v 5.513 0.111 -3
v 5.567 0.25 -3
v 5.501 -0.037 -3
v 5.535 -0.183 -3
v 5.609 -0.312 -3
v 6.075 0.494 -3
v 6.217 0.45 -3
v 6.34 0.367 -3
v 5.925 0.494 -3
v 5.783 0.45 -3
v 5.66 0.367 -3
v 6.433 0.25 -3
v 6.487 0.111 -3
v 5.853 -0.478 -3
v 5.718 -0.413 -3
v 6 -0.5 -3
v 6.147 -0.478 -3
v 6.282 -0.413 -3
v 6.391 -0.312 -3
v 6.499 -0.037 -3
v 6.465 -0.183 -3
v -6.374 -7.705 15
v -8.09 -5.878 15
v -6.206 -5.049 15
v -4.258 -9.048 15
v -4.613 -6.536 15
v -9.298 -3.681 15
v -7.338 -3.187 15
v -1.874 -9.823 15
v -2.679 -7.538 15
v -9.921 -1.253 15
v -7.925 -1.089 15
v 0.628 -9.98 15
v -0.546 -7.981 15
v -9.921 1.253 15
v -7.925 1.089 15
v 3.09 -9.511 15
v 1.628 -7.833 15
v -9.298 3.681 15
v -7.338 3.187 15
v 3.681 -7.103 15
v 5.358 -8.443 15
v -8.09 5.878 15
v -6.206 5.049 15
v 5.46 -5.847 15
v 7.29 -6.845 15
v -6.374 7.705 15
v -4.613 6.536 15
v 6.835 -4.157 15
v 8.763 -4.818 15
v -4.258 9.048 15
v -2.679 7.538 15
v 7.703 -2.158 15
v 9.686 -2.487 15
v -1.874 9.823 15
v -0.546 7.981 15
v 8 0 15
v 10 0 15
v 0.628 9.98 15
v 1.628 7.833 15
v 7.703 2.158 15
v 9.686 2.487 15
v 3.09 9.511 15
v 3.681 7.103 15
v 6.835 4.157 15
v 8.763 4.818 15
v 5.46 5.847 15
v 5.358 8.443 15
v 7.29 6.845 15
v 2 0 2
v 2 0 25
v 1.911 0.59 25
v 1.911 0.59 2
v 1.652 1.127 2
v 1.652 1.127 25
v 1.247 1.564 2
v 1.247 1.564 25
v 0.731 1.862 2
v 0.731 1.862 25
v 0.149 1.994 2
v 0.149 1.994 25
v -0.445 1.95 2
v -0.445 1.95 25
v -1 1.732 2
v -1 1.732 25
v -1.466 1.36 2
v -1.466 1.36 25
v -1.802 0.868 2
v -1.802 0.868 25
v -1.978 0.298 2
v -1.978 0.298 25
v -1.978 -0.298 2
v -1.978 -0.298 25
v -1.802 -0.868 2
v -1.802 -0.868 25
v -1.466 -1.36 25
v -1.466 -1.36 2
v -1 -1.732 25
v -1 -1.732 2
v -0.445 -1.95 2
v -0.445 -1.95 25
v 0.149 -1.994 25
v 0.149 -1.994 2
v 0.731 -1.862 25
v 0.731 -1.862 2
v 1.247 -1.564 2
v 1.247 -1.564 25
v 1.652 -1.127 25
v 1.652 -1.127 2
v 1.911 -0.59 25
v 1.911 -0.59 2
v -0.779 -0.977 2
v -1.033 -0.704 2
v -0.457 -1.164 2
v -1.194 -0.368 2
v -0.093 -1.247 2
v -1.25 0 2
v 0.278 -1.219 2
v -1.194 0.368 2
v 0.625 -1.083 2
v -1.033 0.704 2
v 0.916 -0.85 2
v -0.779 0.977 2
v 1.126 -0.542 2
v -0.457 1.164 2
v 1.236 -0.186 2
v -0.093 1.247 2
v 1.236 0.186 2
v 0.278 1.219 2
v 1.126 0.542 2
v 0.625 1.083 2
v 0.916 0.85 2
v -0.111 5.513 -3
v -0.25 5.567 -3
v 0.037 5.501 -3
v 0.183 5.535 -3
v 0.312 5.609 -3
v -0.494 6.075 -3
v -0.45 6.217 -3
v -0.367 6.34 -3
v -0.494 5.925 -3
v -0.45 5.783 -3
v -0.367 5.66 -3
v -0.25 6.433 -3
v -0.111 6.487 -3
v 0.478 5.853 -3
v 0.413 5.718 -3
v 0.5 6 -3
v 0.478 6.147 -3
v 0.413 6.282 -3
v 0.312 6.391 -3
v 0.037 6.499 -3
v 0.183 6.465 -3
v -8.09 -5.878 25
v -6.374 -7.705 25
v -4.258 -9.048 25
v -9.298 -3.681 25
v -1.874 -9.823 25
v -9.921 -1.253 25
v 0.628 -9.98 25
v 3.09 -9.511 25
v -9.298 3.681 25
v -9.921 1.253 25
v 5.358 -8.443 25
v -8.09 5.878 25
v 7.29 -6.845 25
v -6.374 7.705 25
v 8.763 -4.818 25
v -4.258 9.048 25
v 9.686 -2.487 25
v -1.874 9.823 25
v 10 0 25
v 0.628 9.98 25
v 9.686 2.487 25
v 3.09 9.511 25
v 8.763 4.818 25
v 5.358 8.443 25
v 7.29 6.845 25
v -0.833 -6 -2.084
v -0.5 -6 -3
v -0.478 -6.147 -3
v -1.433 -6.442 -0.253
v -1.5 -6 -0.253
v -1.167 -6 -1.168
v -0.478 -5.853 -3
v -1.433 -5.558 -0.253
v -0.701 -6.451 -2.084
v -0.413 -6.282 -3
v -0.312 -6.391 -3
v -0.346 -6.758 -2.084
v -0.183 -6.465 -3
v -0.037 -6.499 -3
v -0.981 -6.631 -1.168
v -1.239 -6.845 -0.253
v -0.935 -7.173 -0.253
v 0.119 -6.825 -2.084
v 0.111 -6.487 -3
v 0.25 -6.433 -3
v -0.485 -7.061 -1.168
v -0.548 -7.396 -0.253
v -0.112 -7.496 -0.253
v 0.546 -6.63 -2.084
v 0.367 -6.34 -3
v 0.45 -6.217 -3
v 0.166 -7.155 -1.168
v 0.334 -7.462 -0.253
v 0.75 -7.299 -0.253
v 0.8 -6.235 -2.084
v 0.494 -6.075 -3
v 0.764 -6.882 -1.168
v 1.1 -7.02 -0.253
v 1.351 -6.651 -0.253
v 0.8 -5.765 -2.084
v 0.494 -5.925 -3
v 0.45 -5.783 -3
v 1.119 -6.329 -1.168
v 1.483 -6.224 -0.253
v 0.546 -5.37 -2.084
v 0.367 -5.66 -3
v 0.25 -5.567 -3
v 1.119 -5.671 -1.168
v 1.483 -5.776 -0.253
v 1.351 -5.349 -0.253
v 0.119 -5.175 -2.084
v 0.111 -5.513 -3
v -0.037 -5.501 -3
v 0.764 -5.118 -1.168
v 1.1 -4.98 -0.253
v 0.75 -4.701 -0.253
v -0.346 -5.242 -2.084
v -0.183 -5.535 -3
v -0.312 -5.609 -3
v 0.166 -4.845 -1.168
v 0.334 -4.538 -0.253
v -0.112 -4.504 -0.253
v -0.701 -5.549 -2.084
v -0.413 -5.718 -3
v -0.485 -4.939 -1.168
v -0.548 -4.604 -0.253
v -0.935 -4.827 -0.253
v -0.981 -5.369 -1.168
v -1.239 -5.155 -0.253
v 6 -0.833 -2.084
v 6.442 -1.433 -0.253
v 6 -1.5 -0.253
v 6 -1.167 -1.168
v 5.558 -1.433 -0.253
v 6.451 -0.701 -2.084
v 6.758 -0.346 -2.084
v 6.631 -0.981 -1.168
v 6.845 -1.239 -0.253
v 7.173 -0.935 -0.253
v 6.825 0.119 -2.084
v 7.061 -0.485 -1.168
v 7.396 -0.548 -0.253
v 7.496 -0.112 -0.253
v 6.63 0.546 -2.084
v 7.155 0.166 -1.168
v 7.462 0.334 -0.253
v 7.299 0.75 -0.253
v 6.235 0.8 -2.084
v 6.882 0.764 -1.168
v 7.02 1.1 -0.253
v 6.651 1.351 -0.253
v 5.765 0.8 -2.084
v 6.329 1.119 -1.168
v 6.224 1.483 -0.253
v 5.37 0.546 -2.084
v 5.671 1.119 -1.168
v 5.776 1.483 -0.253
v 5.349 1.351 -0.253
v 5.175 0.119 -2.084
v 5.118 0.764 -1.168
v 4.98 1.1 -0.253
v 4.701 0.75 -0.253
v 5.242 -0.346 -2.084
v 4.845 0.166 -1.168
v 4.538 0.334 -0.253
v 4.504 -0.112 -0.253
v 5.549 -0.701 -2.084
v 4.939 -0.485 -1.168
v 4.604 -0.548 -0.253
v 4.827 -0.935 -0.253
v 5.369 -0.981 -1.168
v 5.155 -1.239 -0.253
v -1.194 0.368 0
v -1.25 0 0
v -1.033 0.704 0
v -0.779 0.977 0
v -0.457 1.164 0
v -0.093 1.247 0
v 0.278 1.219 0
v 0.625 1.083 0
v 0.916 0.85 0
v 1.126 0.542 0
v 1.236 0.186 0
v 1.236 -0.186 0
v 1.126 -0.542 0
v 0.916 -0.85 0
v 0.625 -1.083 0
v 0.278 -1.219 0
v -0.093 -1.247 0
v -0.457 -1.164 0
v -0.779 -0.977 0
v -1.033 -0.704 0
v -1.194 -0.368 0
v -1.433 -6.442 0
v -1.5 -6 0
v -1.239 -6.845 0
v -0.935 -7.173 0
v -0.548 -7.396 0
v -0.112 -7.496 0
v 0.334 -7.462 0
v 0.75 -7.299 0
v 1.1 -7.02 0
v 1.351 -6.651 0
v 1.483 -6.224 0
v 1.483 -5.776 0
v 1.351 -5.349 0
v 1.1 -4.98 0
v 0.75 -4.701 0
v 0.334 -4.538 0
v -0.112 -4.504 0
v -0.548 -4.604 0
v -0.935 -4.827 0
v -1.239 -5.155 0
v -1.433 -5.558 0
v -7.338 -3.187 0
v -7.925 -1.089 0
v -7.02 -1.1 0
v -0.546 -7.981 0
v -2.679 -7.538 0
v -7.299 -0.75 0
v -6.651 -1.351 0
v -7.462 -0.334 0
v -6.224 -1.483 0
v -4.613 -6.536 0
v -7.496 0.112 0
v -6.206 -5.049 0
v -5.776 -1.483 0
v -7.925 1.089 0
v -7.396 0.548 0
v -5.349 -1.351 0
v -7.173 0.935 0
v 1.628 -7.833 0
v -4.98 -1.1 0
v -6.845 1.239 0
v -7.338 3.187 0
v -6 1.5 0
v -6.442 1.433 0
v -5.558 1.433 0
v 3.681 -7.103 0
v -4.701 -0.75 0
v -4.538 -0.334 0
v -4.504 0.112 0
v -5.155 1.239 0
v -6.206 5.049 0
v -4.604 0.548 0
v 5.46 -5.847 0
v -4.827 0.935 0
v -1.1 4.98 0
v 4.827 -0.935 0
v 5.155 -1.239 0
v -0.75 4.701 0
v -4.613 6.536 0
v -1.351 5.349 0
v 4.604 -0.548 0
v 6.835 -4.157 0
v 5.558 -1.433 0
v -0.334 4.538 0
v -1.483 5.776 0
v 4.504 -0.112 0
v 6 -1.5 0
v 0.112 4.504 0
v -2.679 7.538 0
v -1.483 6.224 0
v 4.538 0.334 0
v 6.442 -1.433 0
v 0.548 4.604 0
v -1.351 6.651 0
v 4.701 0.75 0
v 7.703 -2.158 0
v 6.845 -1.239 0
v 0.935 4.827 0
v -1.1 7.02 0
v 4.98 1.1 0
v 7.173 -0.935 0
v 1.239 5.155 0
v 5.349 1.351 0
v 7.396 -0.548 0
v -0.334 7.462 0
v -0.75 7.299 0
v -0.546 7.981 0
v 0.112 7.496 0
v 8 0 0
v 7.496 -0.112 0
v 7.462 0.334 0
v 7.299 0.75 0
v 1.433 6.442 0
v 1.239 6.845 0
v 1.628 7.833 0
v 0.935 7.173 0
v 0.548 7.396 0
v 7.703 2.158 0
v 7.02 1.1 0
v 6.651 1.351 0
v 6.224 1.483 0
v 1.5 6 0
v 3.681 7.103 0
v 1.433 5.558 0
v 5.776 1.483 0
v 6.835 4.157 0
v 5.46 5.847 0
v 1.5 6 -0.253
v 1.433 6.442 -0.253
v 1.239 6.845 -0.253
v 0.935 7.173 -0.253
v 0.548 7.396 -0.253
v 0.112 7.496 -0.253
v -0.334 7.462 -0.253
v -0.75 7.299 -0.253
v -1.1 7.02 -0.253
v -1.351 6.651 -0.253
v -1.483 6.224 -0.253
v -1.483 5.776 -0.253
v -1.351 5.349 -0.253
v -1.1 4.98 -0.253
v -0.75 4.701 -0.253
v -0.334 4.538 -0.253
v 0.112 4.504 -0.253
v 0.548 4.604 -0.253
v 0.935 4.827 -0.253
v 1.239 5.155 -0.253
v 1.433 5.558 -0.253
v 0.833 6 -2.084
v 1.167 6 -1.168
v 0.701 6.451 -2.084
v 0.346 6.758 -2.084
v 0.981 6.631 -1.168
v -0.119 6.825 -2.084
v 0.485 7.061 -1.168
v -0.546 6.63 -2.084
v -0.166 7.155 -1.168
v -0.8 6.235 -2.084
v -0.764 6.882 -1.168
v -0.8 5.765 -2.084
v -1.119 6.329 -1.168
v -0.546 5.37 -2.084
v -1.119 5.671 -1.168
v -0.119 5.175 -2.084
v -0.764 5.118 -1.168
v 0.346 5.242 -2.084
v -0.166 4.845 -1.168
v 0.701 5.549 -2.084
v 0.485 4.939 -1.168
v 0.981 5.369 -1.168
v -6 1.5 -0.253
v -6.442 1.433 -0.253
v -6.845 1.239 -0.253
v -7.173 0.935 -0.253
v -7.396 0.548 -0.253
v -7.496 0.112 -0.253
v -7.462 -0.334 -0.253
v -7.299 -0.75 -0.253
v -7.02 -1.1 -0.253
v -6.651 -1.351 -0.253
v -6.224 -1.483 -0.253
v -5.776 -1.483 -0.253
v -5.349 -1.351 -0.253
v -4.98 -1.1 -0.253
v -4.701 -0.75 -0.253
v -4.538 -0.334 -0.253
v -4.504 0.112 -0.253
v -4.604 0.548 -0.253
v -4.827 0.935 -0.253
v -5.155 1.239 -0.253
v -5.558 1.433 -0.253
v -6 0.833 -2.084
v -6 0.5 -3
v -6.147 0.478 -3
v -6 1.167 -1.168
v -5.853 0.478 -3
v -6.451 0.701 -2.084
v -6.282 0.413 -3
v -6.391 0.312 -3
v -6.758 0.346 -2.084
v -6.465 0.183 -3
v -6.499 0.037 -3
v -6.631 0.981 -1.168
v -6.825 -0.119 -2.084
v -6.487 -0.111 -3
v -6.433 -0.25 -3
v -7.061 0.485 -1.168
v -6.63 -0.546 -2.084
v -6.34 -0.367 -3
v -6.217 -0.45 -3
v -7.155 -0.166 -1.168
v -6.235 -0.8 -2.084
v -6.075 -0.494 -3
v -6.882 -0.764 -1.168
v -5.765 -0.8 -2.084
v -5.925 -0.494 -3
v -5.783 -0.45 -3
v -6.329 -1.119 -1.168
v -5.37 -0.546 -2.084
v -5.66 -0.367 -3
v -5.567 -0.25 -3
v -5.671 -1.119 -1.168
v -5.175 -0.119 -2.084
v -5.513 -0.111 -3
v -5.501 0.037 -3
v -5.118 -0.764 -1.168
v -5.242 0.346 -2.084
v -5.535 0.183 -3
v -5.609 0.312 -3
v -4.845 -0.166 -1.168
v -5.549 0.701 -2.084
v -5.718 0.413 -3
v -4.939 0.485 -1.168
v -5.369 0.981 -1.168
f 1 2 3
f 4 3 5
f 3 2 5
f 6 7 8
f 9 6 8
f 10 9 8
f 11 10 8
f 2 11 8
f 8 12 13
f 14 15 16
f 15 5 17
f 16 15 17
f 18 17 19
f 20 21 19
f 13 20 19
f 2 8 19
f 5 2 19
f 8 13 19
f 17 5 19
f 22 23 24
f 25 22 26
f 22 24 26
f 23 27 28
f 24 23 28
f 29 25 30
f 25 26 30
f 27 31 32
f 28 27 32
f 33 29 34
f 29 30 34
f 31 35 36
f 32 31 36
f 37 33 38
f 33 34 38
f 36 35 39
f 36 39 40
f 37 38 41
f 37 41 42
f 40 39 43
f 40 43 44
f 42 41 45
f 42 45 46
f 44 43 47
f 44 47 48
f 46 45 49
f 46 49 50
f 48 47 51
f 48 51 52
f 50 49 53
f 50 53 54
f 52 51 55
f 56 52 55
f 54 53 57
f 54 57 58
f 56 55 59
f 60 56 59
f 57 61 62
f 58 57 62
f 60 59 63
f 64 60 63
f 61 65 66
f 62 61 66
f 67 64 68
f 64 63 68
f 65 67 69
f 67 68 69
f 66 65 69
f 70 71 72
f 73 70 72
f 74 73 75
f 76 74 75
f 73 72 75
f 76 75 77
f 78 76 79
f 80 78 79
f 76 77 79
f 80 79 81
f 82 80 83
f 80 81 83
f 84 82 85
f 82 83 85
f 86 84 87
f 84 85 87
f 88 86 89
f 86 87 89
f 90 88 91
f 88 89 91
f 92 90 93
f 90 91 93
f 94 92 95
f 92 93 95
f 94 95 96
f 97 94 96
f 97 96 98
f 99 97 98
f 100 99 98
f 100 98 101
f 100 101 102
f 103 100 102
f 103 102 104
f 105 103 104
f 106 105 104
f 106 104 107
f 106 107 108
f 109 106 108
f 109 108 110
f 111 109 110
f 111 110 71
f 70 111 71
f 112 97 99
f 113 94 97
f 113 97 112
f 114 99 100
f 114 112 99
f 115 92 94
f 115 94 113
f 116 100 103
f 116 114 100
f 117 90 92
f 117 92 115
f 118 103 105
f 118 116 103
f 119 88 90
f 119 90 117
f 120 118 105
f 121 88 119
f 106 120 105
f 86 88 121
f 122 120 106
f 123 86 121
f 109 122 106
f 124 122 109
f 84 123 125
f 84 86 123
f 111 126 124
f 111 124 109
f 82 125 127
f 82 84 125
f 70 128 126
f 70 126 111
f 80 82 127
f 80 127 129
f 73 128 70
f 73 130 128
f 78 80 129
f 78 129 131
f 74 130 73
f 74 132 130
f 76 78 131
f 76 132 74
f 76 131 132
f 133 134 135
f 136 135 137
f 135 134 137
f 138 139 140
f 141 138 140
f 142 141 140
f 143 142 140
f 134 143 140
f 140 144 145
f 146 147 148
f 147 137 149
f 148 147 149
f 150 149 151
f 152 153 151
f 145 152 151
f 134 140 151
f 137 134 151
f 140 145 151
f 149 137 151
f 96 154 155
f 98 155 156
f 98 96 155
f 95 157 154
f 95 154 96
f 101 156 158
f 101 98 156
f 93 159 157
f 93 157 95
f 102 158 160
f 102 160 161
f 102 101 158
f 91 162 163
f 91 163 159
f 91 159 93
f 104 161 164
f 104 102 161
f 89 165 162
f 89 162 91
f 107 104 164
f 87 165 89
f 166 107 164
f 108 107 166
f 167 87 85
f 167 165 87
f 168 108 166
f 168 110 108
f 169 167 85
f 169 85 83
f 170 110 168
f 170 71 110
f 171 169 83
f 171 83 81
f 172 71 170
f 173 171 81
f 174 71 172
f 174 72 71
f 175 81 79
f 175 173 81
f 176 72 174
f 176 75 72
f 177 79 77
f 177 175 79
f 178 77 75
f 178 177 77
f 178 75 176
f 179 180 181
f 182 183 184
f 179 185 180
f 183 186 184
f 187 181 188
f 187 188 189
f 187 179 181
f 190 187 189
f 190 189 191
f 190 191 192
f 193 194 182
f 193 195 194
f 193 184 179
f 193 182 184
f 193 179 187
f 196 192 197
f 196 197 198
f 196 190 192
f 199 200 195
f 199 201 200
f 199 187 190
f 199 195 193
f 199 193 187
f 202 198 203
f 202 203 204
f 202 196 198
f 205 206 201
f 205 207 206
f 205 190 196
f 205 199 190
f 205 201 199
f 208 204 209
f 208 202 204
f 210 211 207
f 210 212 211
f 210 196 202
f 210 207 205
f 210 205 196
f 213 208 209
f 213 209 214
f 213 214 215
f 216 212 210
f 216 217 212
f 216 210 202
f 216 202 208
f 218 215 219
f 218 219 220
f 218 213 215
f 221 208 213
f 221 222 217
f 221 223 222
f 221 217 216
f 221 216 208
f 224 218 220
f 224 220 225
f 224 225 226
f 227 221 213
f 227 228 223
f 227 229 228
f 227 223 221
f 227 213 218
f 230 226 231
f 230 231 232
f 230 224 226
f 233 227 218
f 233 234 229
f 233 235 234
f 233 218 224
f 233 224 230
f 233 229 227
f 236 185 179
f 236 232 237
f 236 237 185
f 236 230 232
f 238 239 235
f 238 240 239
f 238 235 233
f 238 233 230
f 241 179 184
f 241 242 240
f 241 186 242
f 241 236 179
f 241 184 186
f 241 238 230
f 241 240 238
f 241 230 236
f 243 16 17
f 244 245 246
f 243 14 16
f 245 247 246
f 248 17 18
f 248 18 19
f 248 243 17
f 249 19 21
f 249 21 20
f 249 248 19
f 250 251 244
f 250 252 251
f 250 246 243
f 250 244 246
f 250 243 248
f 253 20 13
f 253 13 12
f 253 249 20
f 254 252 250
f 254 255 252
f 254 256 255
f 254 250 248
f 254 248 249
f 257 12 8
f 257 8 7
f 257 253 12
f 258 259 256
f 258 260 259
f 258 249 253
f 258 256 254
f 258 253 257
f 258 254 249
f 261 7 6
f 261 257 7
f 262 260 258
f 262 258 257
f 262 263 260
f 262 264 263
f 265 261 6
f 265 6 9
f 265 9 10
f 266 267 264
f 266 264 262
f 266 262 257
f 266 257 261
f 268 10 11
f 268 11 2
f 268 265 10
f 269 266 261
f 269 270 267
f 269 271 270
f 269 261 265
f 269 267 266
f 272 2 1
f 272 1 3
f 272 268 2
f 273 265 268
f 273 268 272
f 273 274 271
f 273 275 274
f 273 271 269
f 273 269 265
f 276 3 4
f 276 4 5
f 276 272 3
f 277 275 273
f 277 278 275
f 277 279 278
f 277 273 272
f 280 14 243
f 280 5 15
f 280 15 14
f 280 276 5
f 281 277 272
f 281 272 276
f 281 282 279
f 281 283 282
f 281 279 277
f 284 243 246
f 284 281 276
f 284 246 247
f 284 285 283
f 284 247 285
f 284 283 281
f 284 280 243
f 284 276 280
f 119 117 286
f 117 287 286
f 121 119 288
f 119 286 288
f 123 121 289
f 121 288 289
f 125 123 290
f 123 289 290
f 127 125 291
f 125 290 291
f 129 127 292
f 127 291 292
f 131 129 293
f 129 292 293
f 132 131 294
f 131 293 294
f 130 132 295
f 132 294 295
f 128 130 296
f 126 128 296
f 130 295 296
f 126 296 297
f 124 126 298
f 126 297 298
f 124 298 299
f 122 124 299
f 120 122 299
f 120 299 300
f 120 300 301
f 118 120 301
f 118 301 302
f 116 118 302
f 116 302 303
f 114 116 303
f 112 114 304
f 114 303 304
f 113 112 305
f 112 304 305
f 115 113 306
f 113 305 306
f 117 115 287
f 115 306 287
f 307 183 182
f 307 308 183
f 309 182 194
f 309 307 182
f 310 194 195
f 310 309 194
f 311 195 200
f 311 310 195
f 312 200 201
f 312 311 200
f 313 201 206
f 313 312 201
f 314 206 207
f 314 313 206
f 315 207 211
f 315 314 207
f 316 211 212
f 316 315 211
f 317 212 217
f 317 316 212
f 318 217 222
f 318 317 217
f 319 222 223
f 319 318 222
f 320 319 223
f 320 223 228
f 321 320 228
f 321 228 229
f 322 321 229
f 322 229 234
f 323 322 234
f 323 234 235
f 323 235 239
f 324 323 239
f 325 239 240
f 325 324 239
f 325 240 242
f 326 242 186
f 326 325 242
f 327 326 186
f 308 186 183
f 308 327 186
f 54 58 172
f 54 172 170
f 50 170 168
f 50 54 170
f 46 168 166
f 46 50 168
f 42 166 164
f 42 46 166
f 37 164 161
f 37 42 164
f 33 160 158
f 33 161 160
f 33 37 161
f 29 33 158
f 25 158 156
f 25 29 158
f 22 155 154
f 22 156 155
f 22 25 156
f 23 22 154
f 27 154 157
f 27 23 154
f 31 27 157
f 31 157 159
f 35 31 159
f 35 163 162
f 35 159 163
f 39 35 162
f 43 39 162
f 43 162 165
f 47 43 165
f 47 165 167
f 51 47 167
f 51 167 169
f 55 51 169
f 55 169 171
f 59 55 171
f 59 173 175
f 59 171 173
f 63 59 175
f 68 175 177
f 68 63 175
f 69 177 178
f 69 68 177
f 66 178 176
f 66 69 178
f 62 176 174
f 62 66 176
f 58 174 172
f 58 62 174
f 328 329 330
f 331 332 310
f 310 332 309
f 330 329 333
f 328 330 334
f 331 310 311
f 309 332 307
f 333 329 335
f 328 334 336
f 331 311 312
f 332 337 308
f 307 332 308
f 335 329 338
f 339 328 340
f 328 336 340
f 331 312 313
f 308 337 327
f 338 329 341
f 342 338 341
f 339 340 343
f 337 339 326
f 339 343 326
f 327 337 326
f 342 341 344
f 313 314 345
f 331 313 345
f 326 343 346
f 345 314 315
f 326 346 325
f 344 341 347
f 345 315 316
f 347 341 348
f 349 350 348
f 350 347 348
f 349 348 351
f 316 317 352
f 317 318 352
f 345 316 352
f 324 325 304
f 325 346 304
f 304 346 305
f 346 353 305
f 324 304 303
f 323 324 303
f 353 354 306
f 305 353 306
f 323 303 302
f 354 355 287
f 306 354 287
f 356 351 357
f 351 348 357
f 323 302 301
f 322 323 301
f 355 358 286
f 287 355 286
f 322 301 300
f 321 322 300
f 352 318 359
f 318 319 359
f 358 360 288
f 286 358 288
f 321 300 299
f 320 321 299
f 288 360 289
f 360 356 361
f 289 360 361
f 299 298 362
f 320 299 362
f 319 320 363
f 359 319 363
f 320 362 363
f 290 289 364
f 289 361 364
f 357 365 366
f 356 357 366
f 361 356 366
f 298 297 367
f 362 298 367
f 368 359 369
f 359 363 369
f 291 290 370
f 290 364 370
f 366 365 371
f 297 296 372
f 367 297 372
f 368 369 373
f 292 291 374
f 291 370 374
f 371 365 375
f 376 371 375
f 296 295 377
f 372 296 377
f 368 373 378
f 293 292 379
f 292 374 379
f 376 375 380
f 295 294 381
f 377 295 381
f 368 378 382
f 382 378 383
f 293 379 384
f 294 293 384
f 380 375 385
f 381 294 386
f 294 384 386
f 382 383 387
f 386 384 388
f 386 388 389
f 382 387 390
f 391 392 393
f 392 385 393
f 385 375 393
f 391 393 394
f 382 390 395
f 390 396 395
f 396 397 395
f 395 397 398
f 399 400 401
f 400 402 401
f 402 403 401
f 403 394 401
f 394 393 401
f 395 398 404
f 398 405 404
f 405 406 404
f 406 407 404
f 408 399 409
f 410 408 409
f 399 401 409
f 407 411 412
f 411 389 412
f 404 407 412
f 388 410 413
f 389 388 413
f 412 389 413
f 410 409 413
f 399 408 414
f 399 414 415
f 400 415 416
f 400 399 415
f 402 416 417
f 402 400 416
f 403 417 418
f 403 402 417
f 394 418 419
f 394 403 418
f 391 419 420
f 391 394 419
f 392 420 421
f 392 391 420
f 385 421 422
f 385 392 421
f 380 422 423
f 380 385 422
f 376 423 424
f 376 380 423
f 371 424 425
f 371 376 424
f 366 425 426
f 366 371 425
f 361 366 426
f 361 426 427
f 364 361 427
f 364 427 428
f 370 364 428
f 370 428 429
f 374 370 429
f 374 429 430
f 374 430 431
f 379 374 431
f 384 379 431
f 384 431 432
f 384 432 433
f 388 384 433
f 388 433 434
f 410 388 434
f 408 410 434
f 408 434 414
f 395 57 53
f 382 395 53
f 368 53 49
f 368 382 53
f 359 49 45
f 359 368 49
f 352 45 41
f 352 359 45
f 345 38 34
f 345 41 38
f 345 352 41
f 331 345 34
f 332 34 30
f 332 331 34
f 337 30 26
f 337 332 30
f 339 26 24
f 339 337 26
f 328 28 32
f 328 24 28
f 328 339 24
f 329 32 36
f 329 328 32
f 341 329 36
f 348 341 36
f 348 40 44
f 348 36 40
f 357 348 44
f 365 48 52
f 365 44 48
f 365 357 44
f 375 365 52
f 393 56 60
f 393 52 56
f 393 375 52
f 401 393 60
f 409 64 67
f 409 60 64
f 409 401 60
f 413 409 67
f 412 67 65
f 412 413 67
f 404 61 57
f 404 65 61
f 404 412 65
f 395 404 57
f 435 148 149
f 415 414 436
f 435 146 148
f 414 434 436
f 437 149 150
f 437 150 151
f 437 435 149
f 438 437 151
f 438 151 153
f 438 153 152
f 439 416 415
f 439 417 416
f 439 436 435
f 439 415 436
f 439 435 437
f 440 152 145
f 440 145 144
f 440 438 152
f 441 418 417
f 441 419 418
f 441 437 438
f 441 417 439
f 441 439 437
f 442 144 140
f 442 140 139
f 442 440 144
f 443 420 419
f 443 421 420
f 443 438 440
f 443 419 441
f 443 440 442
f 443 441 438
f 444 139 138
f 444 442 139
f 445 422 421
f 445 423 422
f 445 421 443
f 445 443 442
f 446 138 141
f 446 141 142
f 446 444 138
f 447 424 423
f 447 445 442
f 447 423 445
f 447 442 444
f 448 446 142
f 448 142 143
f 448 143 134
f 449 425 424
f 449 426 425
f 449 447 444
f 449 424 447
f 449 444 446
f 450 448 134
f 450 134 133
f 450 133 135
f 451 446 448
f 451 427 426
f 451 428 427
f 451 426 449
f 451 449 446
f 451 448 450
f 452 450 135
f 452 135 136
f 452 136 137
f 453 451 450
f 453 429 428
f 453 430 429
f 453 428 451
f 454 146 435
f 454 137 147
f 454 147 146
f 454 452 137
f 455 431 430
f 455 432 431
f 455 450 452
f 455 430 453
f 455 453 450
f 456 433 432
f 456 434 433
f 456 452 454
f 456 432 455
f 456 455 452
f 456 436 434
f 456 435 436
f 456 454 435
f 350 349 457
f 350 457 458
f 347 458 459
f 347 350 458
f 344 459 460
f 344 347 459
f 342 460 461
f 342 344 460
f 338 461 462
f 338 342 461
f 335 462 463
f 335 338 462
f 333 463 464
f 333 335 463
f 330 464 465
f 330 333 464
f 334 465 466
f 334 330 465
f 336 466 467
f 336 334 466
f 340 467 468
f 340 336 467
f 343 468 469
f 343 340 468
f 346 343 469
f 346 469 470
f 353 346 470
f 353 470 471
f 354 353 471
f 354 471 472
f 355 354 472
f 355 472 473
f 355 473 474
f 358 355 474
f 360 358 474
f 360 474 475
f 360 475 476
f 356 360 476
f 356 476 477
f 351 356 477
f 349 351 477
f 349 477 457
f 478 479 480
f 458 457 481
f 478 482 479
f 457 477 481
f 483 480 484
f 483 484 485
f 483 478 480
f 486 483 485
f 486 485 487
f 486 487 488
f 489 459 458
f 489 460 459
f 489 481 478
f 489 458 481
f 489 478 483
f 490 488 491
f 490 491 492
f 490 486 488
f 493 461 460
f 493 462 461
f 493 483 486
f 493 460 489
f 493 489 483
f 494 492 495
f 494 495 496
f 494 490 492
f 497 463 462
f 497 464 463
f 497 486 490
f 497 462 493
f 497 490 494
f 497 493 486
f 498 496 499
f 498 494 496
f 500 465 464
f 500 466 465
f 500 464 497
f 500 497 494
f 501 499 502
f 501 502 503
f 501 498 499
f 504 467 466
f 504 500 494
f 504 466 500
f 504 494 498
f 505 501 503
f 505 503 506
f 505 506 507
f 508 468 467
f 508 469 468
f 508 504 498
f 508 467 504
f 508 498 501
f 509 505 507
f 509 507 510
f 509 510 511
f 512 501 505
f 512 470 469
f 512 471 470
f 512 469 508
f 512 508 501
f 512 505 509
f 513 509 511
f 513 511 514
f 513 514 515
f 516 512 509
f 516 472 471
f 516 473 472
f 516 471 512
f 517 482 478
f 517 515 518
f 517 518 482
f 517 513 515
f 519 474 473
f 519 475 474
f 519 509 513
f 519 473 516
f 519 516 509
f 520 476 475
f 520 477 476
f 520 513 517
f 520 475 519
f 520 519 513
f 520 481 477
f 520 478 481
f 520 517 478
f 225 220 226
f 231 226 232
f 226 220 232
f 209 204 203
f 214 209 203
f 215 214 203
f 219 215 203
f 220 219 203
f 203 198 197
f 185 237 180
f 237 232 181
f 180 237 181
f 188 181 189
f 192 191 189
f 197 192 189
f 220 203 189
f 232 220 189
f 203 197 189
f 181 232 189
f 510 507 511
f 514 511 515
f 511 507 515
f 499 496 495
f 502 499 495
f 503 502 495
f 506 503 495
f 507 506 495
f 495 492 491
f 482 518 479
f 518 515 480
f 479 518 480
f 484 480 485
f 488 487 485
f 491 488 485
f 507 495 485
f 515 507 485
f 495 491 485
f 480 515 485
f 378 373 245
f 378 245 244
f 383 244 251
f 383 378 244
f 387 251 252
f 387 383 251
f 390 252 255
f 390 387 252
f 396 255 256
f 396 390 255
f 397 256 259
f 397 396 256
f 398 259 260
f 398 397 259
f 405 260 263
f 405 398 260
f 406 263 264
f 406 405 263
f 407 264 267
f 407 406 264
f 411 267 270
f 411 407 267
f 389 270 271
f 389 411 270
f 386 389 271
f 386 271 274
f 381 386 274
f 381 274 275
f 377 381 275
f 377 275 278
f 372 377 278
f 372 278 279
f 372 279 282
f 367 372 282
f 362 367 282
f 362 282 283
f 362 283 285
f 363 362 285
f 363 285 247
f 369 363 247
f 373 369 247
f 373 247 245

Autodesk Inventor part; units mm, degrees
ref_plane "YZ Plane" through (0, 0, 0) normal (1, 0, 0) x (0, 1, 0)
ref_plane "XZ Plane" through (0, 0, 0) normal (0, 1, 0) x (-1, 0, 0)
ref_plane "XY Plane" through (0, 0, 0) normal (0, 0, 1) x (1, 0, 0)
sketch "Sketch1" plane through (0, 0, 0) normal (0, 0, 1) x (1, 0, 0)
  circle A0 centre (0, 0) radius 8
  circle A1 centre (0, 6) radius 1.5
  dimension "d0" = 16
  dimension "d1" = 3
  dimension "d2" = 6
  dimension "d3" = 0
extrude "Extrusion1" add sketch "Sketch1" along normal blind 15 contours A0 | A1
extrude "Extrusion2" add sketch "Sketch1" against normal blind 3 contours A1
chamfer "Chamfer1" distance 1 angle 70 1 edges at (-1.5, 6, -3) measured on face at (-0.1505, 5.5836, -3)
pattern_circular "Circular Pattern1" count 4 over 360 about axis through (0, 0, 0) along (0, 0, 1) of "Extrusion2", "Chamfer1"
sketch "Sketch3" plane through (0, 0, 15) normal (0, 0, 1) x (1, 0, 0)
  circle A0 centre (0, 0) radius 10
  dimension "d17" = 20
extrude "Extrusion4" add sketch "Sketch3" along normal blind 10
sketch "Sketch2" plane through (0, 0, 0) normal (0, 0, -1) x (-1, 0, 0)
  circle A0 centre (0, 0) radius 1.25
  dimension "d14" = 2.5
extrude "Extrusion3" cut sketch "Sketch2" against normal through all
sketch "Sketch4" plane through (0, 0, 25) normal (0, 0, 1) x (1, 0, 0)
  circle A0 centre (0, 0) radius 2
  dimension "d20" = 4
extrude "Extrusion5" cut sketch "Sketch4" against normal blind 23
properties part number "Motor1Gear"
